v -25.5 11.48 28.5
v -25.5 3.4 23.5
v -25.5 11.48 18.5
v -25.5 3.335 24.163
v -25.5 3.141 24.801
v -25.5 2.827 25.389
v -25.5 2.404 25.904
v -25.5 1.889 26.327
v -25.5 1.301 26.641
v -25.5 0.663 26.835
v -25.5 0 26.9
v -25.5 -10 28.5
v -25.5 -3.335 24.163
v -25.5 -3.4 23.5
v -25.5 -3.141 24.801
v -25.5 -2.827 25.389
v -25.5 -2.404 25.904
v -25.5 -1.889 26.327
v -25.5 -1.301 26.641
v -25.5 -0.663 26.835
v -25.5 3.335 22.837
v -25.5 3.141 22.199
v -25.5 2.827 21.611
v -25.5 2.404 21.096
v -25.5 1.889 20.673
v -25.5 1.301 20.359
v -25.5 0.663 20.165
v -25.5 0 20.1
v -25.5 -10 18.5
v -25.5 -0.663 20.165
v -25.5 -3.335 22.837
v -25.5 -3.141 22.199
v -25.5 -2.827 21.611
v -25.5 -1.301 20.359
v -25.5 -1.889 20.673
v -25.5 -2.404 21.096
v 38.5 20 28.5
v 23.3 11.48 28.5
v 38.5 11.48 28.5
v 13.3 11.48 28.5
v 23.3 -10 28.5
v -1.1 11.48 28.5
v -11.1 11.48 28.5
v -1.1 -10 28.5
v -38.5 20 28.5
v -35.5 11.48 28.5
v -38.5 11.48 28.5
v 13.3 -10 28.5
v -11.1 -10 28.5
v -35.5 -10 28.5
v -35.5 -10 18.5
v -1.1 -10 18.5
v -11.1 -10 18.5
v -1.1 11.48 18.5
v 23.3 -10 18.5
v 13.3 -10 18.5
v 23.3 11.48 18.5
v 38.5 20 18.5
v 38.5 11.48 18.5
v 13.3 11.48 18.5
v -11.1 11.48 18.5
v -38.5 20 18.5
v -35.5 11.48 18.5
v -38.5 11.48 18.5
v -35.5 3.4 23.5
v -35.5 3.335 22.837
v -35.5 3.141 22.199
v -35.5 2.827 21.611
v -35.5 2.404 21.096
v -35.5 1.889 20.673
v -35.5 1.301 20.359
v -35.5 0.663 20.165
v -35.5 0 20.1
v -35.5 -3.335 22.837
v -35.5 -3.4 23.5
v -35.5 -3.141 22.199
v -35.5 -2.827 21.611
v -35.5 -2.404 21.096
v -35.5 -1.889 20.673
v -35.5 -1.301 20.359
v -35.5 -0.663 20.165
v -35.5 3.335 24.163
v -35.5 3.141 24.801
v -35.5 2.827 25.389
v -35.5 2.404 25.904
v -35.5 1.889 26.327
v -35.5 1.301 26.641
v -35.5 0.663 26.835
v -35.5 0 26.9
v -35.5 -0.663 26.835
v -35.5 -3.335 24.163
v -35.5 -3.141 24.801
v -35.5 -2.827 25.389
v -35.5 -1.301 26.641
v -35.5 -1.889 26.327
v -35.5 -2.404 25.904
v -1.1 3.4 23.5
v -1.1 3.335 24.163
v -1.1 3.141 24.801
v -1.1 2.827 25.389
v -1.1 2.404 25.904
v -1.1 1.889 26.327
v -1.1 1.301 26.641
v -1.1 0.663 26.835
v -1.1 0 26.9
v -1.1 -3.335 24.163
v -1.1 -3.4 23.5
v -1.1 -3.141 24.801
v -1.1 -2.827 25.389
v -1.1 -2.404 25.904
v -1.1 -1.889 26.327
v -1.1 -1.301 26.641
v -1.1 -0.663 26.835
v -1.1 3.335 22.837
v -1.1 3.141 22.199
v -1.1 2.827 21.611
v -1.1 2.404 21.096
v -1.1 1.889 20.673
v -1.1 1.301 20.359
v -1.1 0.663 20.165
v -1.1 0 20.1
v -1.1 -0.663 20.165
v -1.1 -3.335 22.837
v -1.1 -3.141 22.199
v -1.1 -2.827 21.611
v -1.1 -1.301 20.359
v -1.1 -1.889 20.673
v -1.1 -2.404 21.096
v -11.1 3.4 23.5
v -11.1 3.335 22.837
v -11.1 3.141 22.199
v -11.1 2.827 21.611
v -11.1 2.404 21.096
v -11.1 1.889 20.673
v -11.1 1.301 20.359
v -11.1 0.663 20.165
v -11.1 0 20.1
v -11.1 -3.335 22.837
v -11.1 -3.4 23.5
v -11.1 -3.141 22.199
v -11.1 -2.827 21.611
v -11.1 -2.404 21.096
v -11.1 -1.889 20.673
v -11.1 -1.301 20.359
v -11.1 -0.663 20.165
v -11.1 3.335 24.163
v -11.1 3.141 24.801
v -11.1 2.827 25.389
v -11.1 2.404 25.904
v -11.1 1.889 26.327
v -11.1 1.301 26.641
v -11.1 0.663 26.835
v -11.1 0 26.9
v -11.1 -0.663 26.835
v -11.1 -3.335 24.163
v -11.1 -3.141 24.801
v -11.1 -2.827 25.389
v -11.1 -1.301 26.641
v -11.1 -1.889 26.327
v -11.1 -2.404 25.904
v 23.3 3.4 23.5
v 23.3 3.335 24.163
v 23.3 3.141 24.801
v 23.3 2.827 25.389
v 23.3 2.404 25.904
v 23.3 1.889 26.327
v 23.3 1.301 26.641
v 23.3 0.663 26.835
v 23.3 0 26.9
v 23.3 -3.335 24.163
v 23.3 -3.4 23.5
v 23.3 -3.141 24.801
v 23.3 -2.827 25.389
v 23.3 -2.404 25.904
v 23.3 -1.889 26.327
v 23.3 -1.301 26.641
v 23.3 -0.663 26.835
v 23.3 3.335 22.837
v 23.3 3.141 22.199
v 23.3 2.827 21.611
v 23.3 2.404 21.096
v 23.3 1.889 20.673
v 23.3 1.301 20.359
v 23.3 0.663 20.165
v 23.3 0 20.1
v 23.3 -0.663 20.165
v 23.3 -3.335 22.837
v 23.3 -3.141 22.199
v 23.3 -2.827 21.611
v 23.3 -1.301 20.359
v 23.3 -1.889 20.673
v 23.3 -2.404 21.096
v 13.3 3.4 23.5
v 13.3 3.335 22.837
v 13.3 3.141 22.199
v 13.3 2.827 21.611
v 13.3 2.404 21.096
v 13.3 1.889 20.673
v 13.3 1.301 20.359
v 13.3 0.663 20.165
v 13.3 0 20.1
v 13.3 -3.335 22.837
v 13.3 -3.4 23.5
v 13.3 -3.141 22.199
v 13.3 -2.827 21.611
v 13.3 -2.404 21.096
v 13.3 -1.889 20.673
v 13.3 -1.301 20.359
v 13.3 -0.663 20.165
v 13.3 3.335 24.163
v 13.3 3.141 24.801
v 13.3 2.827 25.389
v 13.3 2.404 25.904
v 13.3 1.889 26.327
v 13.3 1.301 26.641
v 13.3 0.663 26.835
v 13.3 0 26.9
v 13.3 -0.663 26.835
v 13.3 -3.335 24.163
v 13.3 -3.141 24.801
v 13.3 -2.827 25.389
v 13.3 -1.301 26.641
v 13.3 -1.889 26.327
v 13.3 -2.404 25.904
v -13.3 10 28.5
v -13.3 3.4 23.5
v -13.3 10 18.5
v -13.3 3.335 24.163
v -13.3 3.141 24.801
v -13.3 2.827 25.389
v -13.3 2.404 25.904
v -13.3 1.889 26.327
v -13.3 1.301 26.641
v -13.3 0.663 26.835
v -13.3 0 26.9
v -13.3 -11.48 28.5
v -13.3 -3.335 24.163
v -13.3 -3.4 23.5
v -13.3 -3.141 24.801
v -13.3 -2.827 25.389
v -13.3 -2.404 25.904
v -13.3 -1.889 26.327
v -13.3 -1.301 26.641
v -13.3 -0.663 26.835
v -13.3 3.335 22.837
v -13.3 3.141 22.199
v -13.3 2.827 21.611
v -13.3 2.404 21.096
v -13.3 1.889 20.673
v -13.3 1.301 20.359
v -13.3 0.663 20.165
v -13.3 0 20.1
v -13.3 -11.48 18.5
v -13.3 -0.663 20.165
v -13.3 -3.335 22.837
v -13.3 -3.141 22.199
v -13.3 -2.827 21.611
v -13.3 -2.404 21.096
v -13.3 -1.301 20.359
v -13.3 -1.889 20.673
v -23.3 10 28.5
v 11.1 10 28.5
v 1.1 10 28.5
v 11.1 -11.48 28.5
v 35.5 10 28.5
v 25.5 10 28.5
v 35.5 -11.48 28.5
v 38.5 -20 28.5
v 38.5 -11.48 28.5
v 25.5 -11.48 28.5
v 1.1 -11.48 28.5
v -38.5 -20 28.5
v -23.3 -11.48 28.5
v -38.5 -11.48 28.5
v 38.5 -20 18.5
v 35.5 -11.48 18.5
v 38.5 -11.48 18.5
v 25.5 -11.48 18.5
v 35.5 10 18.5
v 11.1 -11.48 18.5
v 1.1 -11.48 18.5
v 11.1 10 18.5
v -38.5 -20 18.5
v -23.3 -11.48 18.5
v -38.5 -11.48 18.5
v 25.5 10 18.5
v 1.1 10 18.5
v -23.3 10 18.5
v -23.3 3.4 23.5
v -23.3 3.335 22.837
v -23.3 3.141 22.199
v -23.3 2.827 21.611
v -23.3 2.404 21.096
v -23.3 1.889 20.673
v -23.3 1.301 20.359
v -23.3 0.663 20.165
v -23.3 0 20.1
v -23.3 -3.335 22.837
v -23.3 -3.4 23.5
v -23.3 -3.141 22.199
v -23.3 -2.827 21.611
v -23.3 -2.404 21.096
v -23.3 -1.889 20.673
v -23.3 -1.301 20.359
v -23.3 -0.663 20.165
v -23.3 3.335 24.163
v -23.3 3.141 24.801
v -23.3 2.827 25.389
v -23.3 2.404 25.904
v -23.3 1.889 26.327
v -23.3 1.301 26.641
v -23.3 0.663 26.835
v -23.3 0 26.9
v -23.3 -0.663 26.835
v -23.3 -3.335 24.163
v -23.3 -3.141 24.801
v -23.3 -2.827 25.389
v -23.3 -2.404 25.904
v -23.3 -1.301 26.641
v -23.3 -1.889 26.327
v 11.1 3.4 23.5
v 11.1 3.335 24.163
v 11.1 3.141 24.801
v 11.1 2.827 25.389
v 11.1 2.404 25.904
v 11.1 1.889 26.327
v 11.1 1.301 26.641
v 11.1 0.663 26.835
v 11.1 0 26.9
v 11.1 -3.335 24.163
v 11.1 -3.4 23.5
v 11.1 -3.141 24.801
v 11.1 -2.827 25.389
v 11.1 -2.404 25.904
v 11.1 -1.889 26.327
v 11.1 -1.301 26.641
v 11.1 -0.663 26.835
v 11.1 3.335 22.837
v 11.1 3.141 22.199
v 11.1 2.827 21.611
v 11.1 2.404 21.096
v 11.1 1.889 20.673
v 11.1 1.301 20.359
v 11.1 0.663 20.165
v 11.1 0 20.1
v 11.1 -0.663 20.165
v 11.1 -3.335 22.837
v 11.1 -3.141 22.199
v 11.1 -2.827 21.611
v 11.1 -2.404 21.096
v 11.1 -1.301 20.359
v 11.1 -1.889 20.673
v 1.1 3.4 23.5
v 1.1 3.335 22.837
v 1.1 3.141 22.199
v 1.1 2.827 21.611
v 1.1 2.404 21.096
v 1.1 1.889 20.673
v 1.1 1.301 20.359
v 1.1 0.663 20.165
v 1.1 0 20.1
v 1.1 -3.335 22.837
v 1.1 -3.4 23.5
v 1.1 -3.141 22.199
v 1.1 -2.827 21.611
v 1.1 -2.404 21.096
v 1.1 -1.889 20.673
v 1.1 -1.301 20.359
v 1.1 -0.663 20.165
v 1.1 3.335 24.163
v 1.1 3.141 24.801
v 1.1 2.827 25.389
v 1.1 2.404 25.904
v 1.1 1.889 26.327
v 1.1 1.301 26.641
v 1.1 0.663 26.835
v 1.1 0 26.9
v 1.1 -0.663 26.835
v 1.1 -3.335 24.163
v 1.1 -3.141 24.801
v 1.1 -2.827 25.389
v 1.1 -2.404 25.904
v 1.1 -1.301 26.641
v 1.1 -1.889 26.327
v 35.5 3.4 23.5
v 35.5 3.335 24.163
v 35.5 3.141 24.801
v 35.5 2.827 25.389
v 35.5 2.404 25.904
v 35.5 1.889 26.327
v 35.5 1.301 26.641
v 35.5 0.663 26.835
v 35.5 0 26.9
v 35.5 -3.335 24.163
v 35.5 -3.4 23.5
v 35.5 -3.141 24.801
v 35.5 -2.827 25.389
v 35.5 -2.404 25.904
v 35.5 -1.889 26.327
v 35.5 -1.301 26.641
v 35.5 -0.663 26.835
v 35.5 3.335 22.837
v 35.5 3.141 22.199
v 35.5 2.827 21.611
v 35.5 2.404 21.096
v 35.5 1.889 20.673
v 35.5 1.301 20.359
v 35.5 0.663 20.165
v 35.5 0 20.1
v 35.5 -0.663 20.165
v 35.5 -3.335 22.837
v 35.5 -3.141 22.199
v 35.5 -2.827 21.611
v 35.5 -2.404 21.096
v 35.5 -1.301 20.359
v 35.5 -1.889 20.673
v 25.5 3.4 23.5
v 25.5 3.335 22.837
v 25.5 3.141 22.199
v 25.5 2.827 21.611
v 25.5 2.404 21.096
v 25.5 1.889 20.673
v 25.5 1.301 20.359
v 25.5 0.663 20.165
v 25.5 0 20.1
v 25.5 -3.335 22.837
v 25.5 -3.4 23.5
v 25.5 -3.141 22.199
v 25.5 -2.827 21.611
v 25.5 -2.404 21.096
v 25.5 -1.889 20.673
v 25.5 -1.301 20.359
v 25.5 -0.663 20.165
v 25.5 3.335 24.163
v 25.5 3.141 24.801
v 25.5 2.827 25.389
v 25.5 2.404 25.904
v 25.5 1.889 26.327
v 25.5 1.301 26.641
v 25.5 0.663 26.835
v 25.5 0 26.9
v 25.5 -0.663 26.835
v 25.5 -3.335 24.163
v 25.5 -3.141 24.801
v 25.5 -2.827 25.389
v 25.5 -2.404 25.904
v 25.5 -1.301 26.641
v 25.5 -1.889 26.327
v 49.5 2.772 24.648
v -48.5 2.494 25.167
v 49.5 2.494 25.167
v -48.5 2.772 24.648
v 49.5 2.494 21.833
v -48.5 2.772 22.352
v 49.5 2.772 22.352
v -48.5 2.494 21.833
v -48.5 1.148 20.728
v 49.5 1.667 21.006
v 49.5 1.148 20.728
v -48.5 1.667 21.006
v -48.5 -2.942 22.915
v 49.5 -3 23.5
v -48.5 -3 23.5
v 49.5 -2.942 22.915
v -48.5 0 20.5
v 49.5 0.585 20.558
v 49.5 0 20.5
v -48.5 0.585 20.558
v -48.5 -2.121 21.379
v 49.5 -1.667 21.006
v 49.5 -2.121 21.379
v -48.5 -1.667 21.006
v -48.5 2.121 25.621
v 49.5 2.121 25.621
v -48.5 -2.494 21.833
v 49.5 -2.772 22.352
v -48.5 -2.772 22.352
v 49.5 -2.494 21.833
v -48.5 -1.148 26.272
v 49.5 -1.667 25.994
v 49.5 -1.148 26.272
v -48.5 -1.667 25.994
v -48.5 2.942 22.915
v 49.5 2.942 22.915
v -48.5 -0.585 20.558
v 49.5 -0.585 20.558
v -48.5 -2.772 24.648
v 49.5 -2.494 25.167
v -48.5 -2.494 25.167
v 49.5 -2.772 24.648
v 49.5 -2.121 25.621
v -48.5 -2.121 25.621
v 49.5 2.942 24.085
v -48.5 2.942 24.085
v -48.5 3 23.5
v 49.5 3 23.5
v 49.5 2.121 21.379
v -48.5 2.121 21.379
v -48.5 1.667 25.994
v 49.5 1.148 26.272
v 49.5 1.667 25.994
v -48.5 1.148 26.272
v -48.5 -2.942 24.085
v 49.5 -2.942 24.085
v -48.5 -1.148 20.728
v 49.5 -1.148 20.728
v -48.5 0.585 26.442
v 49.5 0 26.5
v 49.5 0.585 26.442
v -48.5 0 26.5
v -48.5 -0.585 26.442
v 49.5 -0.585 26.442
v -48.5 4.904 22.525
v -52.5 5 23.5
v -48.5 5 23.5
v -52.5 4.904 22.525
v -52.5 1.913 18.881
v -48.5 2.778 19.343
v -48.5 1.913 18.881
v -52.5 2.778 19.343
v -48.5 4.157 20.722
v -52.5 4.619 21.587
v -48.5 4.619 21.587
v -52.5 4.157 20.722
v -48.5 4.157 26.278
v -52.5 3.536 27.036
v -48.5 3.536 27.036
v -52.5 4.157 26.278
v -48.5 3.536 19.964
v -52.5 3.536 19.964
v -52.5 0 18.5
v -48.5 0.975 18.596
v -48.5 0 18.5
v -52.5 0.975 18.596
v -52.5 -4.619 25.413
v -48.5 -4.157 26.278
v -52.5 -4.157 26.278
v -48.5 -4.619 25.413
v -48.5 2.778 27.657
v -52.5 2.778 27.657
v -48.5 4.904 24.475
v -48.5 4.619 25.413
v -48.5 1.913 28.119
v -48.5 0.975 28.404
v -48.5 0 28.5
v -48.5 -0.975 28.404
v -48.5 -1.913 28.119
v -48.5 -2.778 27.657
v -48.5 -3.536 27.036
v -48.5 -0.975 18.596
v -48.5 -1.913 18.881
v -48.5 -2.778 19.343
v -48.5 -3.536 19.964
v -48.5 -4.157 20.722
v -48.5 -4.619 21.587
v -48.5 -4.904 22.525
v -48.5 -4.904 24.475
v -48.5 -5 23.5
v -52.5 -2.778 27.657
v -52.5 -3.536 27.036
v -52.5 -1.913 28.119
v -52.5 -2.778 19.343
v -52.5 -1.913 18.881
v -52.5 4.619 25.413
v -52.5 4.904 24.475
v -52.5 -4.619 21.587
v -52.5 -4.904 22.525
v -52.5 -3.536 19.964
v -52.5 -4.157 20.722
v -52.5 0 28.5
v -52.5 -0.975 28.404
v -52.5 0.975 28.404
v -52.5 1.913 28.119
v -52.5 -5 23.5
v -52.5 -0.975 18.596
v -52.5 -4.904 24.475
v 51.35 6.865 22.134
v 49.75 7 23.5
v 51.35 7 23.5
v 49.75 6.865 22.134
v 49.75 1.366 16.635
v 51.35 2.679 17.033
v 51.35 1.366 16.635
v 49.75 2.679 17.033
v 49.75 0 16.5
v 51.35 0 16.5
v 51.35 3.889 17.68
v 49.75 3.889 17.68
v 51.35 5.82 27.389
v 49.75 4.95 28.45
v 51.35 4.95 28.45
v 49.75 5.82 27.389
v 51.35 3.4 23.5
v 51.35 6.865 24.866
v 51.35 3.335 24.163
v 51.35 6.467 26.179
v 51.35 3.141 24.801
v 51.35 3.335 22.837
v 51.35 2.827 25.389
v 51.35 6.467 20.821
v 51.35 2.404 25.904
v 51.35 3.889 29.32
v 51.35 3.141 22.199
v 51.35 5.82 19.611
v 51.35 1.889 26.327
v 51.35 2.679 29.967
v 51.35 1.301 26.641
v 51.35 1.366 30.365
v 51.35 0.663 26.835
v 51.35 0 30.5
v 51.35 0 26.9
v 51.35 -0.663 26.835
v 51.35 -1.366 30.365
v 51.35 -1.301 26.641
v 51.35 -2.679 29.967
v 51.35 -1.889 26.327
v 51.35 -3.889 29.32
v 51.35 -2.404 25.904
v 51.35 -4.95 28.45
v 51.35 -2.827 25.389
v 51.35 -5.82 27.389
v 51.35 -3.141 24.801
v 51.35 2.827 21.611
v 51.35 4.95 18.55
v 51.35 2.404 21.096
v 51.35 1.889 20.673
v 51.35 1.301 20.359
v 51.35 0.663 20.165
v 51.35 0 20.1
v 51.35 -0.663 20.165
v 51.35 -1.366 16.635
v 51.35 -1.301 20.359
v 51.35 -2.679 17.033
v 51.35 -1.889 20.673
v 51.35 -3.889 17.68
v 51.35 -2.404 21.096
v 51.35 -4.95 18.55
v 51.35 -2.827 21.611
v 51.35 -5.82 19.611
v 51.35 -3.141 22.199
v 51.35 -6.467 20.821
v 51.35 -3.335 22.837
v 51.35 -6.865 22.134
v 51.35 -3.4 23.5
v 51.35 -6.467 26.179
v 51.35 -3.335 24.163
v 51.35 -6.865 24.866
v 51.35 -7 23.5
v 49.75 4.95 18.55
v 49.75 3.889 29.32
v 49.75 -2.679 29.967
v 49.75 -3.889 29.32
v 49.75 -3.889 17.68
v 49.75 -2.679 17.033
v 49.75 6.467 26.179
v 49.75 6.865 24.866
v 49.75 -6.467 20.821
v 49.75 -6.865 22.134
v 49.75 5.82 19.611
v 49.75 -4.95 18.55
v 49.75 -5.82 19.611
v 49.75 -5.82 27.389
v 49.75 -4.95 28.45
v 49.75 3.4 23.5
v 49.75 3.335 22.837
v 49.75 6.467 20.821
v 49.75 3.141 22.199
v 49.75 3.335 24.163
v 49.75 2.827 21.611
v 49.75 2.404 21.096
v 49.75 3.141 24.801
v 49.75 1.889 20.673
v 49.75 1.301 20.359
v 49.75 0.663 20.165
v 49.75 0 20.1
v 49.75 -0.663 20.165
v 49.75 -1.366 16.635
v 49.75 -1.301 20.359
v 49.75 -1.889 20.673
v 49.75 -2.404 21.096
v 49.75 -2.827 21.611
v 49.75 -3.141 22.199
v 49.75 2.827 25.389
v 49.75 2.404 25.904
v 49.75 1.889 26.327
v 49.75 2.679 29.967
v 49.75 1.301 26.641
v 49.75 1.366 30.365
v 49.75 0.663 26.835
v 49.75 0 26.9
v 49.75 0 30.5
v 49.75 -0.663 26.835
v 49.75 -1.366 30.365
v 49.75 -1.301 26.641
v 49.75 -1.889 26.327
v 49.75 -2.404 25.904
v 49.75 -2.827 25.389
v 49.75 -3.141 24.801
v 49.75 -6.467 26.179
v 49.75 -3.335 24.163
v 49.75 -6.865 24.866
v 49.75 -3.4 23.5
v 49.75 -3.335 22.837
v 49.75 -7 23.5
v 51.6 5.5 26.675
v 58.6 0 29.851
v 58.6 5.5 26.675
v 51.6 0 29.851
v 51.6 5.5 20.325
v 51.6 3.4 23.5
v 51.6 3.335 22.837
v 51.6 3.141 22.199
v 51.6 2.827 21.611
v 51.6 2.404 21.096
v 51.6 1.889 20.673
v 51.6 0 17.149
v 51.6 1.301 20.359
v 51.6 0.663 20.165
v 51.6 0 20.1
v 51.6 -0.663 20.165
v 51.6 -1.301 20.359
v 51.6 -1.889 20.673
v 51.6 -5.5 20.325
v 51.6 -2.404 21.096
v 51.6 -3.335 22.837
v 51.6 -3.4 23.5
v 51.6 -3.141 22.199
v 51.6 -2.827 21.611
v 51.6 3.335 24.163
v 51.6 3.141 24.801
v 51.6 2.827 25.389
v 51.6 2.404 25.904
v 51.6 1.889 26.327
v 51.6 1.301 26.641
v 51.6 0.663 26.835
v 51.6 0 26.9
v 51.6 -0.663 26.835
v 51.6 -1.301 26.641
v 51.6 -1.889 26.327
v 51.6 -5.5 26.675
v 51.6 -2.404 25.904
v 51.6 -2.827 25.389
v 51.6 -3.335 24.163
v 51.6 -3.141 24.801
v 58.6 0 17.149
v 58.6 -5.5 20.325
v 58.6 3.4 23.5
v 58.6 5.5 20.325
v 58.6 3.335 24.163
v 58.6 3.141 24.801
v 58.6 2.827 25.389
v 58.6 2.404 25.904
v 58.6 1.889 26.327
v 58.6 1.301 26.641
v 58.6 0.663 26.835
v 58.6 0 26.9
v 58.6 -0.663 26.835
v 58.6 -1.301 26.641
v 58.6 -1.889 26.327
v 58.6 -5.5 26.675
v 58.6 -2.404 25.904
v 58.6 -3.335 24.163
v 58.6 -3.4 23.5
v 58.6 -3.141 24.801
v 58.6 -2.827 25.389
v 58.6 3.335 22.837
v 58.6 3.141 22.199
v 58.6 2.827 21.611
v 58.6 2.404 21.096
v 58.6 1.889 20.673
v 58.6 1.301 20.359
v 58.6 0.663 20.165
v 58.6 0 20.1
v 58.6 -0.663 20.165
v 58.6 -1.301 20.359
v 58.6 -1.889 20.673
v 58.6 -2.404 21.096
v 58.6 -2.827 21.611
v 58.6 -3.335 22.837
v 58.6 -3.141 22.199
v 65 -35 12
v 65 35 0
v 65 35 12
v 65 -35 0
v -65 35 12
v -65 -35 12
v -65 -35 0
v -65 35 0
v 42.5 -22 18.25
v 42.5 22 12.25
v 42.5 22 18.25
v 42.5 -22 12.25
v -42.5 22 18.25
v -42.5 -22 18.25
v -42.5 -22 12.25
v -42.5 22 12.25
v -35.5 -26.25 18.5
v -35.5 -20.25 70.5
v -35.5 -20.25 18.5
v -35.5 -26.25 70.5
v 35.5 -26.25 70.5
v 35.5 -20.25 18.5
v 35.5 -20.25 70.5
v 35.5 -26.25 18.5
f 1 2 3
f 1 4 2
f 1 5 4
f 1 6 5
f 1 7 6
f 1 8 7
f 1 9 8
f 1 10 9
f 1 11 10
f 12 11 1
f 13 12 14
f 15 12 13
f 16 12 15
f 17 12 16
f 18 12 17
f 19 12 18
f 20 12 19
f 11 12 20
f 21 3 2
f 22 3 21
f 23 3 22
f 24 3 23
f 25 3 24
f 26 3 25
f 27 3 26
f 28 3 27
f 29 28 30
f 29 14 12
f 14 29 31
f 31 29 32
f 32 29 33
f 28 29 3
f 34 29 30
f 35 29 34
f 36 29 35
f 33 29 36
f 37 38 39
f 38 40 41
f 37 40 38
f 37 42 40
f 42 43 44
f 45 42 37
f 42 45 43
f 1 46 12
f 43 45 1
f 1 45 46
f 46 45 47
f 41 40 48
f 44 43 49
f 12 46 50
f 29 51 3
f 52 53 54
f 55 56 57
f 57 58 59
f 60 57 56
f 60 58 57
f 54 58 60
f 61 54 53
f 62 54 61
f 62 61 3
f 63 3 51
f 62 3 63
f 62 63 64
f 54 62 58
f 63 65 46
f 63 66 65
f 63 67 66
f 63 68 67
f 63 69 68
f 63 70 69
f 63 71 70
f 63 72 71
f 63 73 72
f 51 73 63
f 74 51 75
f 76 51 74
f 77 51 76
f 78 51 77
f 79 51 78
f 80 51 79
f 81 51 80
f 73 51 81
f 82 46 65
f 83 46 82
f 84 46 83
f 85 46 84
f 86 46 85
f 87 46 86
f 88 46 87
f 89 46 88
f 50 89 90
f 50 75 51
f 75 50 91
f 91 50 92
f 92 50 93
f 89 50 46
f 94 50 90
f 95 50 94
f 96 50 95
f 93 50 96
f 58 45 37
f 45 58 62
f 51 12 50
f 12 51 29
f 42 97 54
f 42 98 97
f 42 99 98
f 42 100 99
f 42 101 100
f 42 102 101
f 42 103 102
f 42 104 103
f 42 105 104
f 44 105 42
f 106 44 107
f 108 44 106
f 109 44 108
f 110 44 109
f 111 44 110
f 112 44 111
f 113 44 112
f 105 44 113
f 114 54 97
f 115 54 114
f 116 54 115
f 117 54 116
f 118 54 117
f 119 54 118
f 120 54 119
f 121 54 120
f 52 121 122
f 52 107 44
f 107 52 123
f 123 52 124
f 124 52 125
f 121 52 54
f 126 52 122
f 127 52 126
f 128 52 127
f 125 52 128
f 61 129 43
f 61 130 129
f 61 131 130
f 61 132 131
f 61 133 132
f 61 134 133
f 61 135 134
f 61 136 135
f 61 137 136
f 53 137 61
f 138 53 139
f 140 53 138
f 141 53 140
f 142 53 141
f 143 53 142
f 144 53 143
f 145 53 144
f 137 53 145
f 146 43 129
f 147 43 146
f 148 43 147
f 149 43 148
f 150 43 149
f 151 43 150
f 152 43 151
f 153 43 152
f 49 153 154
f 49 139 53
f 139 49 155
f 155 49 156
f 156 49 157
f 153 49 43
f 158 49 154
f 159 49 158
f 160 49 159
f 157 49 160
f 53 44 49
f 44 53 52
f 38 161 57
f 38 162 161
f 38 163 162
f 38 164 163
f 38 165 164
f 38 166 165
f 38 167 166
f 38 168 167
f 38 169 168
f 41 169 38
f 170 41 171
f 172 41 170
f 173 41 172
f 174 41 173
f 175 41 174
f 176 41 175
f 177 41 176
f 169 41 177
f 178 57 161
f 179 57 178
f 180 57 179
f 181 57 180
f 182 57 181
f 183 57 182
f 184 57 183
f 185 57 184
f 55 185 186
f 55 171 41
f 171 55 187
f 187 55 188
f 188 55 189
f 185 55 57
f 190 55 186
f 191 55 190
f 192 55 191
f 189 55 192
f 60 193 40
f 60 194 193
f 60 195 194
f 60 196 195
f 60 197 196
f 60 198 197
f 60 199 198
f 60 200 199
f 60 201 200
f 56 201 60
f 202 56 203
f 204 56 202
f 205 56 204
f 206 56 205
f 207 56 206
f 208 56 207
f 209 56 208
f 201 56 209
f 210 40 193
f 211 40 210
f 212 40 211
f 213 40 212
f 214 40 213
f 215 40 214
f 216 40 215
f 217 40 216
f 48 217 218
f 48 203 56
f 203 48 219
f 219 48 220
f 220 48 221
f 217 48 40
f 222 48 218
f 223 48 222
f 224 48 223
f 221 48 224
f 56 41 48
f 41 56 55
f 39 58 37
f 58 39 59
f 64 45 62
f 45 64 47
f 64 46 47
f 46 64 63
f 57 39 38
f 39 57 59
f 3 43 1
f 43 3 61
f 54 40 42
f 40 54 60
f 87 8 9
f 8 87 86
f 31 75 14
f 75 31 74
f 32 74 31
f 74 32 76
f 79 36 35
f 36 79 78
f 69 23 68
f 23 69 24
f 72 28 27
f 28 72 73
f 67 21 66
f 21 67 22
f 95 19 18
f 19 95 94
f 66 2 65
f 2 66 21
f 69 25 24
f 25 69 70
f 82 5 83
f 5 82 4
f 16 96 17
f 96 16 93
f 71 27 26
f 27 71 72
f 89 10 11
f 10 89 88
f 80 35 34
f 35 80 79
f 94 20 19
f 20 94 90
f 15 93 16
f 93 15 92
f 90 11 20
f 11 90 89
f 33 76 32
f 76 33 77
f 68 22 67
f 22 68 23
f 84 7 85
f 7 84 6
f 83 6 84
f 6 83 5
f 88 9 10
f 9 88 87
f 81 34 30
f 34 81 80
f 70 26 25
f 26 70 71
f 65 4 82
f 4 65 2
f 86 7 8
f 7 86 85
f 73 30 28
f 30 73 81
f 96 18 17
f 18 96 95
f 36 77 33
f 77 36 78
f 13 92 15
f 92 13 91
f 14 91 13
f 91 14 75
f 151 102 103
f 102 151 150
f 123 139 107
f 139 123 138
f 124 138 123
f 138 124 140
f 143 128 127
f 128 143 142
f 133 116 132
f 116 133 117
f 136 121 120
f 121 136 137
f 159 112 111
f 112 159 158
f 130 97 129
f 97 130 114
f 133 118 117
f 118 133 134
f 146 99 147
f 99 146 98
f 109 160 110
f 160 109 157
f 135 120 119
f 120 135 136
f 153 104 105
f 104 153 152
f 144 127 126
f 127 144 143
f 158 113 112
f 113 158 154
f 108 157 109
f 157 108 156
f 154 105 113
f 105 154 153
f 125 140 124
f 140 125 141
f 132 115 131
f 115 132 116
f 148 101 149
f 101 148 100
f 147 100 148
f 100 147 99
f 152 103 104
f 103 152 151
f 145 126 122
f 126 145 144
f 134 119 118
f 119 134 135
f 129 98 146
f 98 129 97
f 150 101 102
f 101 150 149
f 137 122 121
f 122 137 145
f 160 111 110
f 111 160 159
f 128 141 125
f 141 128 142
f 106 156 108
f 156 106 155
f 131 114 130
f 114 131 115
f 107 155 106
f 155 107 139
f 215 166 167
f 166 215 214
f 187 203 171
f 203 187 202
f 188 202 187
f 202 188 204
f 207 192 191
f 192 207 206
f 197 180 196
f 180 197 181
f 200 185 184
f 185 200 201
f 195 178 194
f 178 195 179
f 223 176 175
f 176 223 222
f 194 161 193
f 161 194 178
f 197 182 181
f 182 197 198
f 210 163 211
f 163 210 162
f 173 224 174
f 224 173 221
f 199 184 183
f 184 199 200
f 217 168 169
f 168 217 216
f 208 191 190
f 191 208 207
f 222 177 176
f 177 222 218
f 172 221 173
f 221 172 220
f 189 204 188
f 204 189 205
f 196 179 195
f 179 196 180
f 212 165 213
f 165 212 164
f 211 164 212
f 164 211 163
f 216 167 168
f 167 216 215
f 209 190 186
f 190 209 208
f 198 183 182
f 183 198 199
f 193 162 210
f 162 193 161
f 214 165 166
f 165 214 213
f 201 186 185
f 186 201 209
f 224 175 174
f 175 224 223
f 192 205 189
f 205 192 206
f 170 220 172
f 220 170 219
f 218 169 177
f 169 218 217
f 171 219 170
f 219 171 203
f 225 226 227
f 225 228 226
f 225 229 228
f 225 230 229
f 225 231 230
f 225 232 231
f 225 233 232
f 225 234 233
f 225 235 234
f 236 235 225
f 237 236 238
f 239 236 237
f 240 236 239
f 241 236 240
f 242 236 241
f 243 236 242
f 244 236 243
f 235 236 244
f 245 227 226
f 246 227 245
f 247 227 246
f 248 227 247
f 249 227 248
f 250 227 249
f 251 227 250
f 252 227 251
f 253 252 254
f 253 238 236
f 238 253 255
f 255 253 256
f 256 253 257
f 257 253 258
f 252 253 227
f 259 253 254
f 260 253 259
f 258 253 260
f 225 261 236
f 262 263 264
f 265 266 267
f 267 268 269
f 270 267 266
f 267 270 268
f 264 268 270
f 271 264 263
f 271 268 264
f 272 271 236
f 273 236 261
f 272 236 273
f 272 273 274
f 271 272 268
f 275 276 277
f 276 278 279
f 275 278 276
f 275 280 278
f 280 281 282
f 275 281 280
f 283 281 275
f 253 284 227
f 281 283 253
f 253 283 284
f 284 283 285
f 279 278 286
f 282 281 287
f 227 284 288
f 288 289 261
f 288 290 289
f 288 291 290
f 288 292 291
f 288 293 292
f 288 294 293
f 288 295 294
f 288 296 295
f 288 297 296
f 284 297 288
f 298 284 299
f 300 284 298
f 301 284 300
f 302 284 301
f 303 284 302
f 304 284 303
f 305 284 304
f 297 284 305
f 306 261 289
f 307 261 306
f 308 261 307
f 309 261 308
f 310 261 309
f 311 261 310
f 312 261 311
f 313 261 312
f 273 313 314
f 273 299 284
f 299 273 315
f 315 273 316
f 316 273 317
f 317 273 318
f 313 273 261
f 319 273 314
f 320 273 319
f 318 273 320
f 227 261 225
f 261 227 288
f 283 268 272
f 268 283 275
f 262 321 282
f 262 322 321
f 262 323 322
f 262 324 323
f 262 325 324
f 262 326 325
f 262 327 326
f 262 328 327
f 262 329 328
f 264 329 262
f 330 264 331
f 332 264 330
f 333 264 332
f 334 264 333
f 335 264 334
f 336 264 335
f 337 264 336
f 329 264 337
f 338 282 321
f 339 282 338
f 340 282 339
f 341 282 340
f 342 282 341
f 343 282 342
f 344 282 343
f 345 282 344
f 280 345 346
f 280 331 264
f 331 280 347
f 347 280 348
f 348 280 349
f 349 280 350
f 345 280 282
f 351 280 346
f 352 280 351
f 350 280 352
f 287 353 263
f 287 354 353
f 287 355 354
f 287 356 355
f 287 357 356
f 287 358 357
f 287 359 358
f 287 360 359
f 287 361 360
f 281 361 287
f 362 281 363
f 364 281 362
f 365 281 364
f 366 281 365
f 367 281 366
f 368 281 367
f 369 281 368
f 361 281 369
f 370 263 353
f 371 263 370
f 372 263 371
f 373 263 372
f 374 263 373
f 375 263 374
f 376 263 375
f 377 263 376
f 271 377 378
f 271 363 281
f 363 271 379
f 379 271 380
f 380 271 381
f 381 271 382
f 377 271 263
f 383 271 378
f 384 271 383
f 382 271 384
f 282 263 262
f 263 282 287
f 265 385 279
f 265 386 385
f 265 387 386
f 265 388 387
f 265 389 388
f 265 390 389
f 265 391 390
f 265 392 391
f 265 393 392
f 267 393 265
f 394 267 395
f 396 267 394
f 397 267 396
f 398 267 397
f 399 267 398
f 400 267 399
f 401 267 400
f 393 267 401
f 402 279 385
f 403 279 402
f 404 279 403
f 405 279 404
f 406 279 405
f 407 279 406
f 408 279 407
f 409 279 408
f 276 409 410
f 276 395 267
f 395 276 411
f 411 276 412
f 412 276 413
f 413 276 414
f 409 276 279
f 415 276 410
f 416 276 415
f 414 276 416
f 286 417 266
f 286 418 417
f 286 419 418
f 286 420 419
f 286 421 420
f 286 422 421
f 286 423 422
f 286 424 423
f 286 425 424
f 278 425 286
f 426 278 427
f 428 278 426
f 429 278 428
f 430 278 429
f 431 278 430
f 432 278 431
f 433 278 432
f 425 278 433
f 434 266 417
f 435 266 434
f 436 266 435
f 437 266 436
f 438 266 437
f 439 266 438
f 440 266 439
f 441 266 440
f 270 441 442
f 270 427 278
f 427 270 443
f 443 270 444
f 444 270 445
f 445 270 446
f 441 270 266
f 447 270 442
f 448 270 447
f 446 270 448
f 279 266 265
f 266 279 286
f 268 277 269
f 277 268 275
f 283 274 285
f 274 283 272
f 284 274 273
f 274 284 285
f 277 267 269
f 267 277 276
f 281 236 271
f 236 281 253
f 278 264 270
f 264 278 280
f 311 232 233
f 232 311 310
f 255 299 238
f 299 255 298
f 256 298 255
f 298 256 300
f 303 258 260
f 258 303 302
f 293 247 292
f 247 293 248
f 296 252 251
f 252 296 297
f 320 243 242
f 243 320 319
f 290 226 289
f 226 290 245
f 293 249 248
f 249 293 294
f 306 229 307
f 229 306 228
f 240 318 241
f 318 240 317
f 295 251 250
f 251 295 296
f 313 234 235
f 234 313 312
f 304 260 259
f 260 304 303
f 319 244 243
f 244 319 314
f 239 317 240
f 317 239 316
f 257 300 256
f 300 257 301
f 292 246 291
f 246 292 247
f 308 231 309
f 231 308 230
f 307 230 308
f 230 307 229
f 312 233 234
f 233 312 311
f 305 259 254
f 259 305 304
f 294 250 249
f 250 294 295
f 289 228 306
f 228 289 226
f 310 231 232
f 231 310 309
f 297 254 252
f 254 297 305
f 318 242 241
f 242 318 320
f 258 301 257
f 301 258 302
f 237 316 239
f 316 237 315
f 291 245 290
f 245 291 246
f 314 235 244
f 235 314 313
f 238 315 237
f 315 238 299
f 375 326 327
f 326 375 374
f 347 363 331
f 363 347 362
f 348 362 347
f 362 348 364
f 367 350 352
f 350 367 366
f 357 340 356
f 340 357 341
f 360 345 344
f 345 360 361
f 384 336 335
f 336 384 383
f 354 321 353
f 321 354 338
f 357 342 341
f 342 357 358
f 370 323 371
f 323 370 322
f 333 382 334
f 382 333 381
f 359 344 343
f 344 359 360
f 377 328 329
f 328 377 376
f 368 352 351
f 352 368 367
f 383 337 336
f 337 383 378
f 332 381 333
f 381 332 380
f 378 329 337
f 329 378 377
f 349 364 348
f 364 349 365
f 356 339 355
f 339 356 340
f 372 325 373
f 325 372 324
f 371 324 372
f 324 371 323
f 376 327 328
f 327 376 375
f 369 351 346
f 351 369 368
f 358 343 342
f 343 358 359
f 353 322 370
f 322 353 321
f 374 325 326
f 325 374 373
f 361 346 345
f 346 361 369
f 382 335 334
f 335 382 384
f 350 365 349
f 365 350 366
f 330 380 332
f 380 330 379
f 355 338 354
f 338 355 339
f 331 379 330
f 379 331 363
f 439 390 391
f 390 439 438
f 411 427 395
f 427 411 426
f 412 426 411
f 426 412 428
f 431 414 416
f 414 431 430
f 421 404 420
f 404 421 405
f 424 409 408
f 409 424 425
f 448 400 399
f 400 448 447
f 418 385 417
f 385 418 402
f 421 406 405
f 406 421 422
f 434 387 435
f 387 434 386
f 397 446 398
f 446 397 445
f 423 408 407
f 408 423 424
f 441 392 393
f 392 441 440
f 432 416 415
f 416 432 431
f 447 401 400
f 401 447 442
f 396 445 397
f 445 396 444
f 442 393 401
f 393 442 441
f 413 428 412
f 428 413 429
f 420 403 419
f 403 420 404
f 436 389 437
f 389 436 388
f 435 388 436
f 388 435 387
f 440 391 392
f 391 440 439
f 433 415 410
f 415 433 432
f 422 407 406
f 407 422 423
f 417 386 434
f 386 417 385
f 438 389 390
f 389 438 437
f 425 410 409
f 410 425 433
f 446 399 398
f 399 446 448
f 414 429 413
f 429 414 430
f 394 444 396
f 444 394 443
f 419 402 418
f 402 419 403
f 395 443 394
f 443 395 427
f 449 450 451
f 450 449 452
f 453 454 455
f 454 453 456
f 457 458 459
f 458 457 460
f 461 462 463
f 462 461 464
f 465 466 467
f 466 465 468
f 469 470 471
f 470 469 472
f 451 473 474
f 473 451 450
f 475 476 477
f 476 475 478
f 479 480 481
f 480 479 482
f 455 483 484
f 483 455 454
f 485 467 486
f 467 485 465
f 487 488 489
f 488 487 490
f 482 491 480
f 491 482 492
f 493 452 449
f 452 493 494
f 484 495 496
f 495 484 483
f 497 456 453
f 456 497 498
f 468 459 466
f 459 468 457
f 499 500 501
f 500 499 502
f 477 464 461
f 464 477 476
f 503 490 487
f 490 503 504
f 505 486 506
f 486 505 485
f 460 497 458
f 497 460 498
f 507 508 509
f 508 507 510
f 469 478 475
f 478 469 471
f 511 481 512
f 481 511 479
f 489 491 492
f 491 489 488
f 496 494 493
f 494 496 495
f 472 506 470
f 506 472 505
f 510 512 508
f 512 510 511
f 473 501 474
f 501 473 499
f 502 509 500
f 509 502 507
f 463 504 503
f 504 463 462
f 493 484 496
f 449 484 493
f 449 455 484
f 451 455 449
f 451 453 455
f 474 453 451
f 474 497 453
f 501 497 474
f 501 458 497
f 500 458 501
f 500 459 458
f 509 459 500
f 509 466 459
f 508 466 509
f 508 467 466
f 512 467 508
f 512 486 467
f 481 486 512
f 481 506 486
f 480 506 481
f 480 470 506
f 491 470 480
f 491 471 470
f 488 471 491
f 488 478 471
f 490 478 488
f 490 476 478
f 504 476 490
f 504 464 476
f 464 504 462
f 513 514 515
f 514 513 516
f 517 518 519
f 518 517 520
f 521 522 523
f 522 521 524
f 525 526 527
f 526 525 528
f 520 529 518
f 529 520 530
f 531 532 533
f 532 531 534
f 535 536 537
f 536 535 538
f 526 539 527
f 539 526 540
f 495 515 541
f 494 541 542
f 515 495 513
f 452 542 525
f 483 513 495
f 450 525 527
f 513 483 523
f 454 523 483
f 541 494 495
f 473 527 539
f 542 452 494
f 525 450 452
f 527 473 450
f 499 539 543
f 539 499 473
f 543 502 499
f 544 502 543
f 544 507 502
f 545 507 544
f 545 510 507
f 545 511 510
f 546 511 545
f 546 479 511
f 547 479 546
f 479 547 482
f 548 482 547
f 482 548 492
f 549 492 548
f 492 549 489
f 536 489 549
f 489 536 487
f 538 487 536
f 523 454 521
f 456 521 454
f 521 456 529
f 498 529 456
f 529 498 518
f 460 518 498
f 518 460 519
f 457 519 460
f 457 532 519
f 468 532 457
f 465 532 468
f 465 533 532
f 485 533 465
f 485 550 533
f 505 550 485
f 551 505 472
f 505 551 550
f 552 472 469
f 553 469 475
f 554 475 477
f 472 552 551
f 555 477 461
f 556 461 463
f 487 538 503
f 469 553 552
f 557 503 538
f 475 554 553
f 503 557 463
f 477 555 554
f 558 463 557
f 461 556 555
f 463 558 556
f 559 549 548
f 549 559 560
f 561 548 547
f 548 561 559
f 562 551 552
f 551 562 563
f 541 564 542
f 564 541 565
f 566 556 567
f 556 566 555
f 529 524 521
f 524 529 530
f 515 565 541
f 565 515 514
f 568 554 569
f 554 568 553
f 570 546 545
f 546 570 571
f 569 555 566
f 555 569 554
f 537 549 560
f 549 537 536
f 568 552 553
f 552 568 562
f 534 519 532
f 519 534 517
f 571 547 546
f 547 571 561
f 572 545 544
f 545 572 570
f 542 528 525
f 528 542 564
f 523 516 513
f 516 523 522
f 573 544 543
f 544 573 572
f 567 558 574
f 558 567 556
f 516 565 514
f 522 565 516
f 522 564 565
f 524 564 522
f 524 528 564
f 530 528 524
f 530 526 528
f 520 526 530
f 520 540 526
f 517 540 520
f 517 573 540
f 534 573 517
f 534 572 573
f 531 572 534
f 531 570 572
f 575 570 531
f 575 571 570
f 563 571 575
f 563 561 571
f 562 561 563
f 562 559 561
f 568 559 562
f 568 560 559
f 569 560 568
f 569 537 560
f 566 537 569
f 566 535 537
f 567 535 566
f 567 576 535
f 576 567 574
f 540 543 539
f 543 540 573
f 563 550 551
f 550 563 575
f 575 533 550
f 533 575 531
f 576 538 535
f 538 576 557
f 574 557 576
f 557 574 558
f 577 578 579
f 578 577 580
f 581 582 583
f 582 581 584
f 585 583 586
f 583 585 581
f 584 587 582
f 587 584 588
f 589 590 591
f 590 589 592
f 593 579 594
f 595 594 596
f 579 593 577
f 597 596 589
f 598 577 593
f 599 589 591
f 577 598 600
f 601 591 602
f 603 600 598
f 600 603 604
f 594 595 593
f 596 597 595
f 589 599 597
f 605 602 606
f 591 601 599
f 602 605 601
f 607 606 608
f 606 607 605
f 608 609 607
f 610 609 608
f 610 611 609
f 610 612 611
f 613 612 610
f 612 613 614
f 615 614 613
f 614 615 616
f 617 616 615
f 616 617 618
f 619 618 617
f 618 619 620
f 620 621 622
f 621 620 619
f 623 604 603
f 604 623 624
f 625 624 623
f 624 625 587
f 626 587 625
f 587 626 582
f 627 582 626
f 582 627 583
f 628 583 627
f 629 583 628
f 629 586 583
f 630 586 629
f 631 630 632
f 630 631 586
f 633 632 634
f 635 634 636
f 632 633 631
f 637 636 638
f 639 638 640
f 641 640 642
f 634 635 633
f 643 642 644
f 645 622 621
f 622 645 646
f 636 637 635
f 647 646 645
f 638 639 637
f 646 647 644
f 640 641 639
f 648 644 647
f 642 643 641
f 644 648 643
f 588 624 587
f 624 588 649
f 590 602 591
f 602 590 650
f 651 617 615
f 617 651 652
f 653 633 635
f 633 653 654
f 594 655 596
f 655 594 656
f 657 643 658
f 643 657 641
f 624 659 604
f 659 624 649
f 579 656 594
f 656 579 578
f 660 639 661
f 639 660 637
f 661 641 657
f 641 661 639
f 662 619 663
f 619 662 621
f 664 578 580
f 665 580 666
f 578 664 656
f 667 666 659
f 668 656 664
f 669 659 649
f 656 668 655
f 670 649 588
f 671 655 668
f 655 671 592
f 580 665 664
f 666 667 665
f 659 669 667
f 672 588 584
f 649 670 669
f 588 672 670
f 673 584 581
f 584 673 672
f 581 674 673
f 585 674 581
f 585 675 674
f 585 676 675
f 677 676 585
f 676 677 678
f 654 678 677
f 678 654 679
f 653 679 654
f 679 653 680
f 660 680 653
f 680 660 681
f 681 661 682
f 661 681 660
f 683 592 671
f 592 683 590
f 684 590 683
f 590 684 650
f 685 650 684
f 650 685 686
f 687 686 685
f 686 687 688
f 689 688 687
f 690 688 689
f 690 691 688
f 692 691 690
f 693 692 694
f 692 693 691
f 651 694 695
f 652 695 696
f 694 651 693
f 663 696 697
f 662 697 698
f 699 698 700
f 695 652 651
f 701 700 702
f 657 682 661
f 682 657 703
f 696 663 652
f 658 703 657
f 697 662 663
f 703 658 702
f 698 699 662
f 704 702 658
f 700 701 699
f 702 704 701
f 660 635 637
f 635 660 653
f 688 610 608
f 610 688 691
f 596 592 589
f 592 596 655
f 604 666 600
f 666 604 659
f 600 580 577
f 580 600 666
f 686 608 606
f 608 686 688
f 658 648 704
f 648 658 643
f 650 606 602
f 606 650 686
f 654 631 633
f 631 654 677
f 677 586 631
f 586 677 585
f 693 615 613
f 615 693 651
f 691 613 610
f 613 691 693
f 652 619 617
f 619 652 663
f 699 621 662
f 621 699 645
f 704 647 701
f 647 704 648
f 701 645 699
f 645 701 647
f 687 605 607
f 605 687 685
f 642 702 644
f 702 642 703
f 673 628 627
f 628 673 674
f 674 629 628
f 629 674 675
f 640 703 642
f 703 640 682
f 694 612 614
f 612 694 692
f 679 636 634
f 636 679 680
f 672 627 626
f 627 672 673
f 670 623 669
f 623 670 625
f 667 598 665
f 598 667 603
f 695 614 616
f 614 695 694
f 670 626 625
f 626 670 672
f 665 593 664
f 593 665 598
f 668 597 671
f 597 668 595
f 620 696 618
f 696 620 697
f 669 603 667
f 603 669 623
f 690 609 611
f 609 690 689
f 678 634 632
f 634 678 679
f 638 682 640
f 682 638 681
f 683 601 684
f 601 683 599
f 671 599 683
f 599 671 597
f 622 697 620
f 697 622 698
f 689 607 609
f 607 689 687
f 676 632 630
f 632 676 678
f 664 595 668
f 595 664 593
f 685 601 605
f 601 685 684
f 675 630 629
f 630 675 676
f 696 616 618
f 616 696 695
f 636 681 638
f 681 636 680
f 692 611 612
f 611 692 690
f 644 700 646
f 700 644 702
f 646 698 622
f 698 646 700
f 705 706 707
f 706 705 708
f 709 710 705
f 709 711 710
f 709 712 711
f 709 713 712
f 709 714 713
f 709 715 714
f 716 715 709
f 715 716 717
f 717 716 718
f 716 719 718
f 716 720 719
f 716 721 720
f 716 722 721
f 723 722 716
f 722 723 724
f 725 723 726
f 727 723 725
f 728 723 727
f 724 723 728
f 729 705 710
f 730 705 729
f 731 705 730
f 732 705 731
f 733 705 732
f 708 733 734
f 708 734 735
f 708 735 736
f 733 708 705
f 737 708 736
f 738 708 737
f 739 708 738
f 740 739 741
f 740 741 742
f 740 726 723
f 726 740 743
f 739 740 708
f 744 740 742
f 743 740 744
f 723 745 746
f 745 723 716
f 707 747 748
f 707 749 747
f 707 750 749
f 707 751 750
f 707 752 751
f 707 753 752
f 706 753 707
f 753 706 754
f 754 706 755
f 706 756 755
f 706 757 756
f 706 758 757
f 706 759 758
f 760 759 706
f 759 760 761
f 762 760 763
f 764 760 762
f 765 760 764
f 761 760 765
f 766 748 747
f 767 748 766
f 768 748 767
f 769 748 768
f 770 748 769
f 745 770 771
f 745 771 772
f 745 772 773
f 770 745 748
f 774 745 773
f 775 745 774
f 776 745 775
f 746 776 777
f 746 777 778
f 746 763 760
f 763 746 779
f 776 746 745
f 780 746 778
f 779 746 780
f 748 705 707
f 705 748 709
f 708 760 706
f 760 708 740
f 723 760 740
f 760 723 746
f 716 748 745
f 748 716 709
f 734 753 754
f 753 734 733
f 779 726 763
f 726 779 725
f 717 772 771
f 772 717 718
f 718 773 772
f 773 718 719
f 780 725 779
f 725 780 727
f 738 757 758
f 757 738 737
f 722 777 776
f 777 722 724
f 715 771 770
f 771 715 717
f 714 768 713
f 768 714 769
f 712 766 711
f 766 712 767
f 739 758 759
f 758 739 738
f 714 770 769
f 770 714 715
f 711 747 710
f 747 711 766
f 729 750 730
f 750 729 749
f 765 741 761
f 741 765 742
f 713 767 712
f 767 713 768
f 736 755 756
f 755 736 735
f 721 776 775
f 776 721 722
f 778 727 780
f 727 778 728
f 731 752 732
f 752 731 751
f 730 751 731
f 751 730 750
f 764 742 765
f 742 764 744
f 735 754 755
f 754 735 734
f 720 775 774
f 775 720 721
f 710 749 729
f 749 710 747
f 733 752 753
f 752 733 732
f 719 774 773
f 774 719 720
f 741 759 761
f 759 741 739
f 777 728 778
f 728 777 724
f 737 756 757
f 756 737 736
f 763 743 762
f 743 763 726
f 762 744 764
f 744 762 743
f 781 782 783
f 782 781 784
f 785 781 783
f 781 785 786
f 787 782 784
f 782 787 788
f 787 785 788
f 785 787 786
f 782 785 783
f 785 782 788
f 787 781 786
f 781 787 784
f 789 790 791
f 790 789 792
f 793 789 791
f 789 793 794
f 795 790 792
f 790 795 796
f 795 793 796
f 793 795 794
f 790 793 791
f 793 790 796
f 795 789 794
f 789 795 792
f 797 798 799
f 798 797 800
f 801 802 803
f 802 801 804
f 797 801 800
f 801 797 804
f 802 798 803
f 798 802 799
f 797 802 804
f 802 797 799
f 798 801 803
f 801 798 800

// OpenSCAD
$fn = 32;

// ------------------------------------------------------------------------
// Comb hinge with flap: leaf 77 x 20 mm, pin d6, flap 52 mm
// Every part is its own module, assembly() places every instance.
// ------------------------------------------------------------------------

// --- part 1 ---
module hinge_bed() {
  difference() {
    translate([-65, -35, 0]) cube([130, 70, 12]);
  }
}

// --- part 2 ---
module hinge_riser() {
  difference() {
    translate([-42.5, -22, 0]) cube([85, 44, 6]);
  }
}

// --- part 3 ---
module hinge_leaf_a() {
  difference() {
    union() {
      translate([-35.5, -10, -5]) cube([10, 30, 10]);
      translate([-11.1, -10, -5]) cube([10, 30, 10]);
      translate([13.3, -10, -5]) cube([10, 30, 10]);
      translate([-38.5, 11.48, -5]) cube([77, 8.52, 10]);
    }
    translate([-30.5, 0, 0]) rotate([0, 90, 0]) cylinder(h = 12, d = 6.8, center = true);
    translate([-6.1, 0, 0]) rotate([0, 90, 0]) cylinder(h = 12, d = 6.8, center = true);
    translate([18.3, 0, 0]) rotate([0, 90, 0]) cylinder(h = 12, d = 6.8, center = true);
  }
}

// --- part 4 ---
module hinge_leaf_b() {
  difference() {
    union() {
      translate([-23.3, -20, -5]) cube([10, 30, 10]);
      translate([1.1, -20, -5]) cube([10, 30, 10]);
      translate([25.5, -20, -5]) cube([10, 30, 10]);
      translate([-38.5, -20, -5]) cube([77, 8.52, 10]);
    }
    translate([-18.3, 0, 0]) rotate([0, 90, 0]) cylinder(h = 12, d = 6.8, center = true);
    translate([6.1, 0, 0]) rotate([0, 90, 0]) cylinder(h = 12, d = 6.8, center = true);
    translate([30.5, 0, 0]) rotate([0, 90, 0]) cylinder(h = 12, d = 6.8, center = true);
  }
}

// --- part 5 ---
module hinge_flap() {
  difference() {
    translate([-35.5, -26, 0]) cube([71, 52, 6]);
  }
}

// --- part 6 ---
module hinge_pin() {
  rotate([0, 90, 0]) cylinder(h = 99, d = 6, center = true);
  translate([-52.5, 0, 0]) rotate([0, 90, 0]) cylinder(h = 4, d = 10);
}

// --- part 7 ---
module pin_washer() {
  difference() {
      translate([0, 0, 0]) cylinder(h = 1.6, d = 14);
      translate([0, 0, -1]) cylinder(h = 3.6, d = 6.8);
    }
}

// --- part 8 ---
module pin_nut() {
  difference() {
    linear_extrude(height = 7) polygon(points = [[6.351, 0], [3.175, 5.5], [-3.175, 5.5], [-6.351, 0], [-3.175, -5.5], [3.175, -5.5]]);
    translate([0, 0, -1]) cylinder(h = 9, d = 6.8);
  }
}

// --- assembly ---
module assembly() {
  color([0.80, 0.24, 0.20]) translate([0, 0, 0]) rotate([0, 0, 0]) hinge_bed();
  color([0.20, 0.45, 0.75]) translate([0, 0, 12.25]) rotate([0, 0, 0]) hinge_riser();
  color([0.25, 0.62, 0.32]) translate([0, 0, 23.5]) rotate([0, 0, 0]) hinge_leaf_a();
  color([0.92, 0.70, 0.18]) translate([0, 0, 23.5]) rotate([0, 0, 0]) hinge_leaf_b();
  color([0.58, 0.35, 0.70]) translate([0, -20.25, 44.5]) rotate([90, 0, 0]) hinge_flap();
  color([0.16, 0.66, 0.66]) translate([0, 0, 23.5]) rotate([0, 0, 0]) hinge_pin();
  color([0.85, 0.48, 0.18]) translate([49.75, 0, 23.5]) rotate([0, 90, 0]) pin_washer();
  color([0.55, 0.60, 0.65]) translate([51.6, 0, 23.5]) rotate([0, 90, 0]) pin_nut();
}

assembly();
